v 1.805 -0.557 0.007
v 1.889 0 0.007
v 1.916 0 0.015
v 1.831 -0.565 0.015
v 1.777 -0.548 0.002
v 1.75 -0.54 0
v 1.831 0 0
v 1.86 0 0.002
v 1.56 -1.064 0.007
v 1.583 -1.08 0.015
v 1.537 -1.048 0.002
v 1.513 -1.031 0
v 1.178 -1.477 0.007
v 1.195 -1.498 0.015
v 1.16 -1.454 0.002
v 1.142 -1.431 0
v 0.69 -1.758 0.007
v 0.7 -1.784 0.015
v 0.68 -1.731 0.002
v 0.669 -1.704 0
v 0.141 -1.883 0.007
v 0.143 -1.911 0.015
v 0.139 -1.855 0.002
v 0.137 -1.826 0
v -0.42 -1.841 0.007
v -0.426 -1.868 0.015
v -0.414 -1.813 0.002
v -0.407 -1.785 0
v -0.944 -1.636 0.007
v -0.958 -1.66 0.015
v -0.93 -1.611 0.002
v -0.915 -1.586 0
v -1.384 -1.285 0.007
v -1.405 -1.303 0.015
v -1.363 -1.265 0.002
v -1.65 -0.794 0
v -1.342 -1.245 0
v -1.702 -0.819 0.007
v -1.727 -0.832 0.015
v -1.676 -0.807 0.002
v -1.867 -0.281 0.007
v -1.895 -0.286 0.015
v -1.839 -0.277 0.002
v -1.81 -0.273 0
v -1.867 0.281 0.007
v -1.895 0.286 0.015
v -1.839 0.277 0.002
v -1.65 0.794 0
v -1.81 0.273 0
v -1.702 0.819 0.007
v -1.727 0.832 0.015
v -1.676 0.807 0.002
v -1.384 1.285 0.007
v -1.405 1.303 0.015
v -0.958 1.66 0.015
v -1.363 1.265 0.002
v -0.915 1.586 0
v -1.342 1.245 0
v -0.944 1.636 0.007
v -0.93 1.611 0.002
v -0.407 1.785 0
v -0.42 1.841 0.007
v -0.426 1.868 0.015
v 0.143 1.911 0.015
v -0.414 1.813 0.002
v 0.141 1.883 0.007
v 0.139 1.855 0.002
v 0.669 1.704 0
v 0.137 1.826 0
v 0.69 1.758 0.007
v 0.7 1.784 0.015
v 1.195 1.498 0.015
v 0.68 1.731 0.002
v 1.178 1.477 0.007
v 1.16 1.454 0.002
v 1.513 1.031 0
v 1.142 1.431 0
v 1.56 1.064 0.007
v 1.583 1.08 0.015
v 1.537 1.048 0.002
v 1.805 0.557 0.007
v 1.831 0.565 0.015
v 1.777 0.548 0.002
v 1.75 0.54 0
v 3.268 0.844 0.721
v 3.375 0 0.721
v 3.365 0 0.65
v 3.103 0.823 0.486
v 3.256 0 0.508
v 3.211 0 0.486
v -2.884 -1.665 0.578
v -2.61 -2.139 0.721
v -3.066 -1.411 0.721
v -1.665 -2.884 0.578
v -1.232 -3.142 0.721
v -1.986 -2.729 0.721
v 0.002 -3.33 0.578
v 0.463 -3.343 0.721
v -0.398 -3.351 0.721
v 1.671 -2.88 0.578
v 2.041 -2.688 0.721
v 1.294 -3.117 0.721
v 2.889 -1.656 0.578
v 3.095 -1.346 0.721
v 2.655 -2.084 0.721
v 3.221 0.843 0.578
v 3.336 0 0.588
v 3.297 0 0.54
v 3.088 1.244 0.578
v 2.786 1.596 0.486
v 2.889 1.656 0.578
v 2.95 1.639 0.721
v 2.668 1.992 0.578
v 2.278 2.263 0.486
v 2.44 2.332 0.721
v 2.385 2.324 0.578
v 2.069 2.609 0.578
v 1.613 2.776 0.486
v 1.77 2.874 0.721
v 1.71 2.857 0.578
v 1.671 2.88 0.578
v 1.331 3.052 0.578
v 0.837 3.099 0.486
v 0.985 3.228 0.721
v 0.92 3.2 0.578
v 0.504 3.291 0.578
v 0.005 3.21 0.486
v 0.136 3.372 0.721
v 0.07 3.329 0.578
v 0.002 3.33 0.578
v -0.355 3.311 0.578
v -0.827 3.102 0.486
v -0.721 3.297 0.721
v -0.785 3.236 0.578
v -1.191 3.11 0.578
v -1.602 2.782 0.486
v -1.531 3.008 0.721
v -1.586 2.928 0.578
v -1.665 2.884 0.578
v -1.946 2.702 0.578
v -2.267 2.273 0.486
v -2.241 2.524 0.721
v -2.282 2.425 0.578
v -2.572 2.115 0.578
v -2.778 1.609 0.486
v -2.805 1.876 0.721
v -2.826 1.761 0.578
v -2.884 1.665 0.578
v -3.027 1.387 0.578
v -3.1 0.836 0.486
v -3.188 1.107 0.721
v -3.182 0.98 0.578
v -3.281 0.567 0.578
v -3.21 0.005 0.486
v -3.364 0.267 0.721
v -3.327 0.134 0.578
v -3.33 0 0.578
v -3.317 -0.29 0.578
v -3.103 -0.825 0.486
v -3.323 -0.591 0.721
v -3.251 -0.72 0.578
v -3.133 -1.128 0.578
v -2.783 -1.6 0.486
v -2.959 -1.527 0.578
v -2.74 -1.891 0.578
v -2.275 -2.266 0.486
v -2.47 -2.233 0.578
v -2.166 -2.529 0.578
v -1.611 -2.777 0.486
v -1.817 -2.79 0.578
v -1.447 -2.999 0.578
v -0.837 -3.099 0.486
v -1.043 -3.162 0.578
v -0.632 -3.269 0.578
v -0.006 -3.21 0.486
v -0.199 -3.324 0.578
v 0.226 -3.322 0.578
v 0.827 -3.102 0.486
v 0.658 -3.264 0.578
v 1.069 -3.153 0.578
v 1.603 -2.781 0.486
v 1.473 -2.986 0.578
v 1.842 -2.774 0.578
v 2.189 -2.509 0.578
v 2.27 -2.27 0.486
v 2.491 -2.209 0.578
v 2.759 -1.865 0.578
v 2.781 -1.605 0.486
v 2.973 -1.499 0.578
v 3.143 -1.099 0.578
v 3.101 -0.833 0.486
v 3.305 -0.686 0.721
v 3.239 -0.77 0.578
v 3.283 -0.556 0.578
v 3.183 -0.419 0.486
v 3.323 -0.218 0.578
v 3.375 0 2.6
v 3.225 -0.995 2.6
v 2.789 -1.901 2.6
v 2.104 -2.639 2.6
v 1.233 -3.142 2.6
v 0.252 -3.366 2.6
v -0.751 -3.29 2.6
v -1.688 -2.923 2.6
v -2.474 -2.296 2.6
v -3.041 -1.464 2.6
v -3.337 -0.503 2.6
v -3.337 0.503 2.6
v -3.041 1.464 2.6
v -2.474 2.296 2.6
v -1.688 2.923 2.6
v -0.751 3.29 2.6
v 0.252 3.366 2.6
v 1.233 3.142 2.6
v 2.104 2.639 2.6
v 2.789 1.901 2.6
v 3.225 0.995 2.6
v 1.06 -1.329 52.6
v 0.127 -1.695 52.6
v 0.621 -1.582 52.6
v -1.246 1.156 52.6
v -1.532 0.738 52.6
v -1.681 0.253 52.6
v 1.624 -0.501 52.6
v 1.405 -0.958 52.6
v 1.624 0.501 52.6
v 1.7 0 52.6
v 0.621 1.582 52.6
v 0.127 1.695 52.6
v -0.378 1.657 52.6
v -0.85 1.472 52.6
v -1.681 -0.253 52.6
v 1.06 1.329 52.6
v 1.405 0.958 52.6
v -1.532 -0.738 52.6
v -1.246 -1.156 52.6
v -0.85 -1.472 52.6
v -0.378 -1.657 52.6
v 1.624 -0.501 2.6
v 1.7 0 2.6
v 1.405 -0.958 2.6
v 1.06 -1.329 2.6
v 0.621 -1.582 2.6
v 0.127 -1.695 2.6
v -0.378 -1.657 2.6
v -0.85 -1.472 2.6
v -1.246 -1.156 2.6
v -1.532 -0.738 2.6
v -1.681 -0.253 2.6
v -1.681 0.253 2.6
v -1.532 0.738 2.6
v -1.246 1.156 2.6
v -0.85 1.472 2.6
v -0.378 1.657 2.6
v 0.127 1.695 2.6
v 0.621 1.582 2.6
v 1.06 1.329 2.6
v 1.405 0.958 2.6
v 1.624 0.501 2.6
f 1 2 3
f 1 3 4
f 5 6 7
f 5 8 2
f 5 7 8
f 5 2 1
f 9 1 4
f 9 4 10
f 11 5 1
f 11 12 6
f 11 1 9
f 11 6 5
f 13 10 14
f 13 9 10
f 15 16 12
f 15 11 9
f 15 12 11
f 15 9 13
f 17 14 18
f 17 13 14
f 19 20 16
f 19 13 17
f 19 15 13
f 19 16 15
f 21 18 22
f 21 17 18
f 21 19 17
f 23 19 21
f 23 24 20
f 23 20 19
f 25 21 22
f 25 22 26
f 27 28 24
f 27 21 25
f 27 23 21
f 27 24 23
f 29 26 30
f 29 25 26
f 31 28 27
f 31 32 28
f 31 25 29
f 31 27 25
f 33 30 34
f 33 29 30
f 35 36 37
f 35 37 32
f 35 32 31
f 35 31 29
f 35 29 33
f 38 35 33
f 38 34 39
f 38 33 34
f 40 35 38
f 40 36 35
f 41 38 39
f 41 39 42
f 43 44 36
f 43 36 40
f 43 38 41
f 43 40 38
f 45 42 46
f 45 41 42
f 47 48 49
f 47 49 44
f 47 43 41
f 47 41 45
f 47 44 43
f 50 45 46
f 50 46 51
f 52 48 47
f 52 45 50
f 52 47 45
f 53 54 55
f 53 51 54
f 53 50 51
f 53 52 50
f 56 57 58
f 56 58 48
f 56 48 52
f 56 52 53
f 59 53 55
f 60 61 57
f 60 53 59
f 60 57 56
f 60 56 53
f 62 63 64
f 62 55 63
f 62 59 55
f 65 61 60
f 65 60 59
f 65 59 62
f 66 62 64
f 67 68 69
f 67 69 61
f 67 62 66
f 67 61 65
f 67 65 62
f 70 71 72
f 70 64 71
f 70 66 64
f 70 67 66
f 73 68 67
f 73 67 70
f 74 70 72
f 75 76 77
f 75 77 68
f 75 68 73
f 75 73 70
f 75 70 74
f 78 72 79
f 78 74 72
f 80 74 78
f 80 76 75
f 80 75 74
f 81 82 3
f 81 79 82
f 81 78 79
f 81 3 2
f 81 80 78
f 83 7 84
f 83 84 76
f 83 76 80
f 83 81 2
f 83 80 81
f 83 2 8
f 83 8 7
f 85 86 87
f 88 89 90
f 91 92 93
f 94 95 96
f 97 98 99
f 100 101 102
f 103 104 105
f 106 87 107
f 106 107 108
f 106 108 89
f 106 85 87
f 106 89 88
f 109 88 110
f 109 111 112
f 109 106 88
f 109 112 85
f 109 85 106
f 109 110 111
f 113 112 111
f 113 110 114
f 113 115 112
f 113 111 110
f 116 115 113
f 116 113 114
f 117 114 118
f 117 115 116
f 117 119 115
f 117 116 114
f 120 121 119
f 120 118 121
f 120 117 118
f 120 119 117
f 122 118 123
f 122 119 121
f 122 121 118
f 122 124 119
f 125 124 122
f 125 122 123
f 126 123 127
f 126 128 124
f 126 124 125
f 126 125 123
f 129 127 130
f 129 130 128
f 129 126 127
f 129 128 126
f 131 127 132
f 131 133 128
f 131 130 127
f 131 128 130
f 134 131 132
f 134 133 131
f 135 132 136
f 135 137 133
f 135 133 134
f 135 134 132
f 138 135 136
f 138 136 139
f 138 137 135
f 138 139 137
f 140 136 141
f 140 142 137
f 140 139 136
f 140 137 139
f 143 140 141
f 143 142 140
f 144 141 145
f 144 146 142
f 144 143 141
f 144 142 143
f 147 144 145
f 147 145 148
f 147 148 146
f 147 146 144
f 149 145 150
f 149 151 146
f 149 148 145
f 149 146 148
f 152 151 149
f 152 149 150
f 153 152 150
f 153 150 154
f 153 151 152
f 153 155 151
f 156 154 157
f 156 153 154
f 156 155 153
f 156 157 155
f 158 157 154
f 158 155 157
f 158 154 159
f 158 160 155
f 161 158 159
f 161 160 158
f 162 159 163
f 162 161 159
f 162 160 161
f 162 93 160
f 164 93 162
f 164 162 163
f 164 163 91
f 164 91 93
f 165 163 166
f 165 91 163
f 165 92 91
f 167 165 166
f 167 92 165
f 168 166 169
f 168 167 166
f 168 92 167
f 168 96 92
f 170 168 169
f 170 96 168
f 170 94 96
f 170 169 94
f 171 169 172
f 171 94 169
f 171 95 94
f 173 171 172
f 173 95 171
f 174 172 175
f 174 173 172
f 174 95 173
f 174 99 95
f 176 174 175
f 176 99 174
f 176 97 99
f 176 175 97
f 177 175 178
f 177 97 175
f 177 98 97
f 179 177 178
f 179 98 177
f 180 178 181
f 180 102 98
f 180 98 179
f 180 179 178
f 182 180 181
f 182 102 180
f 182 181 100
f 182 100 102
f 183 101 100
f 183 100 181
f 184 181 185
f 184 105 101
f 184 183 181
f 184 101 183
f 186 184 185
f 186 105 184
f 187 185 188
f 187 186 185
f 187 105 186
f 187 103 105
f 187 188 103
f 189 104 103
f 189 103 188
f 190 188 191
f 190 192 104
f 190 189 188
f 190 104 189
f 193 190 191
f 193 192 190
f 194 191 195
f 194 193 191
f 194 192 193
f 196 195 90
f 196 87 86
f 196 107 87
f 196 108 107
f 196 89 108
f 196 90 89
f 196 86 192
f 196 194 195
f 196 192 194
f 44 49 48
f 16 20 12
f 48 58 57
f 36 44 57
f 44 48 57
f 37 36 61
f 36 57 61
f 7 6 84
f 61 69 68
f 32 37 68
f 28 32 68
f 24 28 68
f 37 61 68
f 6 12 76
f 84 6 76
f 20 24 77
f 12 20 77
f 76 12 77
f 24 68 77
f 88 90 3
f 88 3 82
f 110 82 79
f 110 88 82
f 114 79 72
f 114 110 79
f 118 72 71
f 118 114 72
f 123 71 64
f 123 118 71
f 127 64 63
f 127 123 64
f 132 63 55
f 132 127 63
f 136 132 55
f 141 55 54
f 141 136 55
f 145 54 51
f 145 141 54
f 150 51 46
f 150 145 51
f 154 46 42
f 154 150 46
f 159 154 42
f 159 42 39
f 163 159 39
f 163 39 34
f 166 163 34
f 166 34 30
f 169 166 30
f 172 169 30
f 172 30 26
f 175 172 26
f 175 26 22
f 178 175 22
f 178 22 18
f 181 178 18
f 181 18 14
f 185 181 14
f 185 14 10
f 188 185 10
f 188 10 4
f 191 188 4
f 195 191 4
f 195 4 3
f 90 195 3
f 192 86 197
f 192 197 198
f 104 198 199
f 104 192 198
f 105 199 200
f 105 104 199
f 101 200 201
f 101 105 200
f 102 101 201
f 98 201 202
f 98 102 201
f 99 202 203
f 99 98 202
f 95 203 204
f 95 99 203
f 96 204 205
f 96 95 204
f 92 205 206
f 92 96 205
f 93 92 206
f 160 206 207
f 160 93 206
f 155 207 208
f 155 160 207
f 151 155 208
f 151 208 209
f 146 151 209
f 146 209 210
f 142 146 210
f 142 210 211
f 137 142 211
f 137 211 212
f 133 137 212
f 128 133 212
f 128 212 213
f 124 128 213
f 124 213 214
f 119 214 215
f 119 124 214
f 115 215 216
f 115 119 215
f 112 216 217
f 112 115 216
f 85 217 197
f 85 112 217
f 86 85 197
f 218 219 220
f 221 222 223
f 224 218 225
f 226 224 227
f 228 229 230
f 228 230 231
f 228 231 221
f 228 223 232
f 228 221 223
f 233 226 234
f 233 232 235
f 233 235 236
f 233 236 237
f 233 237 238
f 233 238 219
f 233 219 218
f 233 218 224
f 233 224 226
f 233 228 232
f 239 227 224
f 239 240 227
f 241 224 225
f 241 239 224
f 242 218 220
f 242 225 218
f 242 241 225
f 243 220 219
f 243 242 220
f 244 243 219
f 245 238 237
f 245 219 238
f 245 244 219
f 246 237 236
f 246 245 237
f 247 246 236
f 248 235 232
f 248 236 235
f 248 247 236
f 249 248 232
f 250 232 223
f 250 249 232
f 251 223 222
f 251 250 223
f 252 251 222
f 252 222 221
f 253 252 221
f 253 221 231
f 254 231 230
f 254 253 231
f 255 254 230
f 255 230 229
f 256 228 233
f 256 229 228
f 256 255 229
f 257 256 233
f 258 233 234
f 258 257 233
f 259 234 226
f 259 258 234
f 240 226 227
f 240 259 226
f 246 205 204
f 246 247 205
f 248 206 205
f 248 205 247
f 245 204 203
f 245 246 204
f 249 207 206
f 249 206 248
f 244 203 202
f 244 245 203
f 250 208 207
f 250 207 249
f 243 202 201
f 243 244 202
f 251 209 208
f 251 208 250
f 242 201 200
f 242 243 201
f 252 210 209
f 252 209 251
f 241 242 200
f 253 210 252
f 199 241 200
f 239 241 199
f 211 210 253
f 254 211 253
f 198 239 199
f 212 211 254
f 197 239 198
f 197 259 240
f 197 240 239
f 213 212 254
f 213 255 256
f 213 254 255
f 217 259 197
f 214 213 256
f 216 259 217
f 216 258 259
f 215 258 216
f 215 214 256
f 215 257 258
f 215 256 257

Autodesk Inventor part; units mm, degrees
ref_plane "YZ Plane" through (0, 0, 0) normal (1, 0, 0) x (0, 1, 0)
ref_plane "XZ Plane" through (0, 0, 0) normal (0, 1, 0) x (-1, 0, 0)
ref_plane "XY Plane" through (0, 0, 0) normal (0, 0, 1) x (1, 0, 0)
sketch "Sketch1" plane through (0, 0, 0) normal (0, 0, 1) x (1, 0, 0)
  circle A0 centre (0, 0) radius 3.375
  dimension "d0" = 6.75
extrude "Extrusion1" add sketch "Sketch1" along normal blind 2.6
sketch "Sketch2" plane through (0, 0, 2.6) normal (0, 0, 1) x (1, 0, 0)
  circle A0 centre (0, 0) radius 1.7
  dimension "d3" = 3.4
extrude "Extrusion2" add sketch "Sketch2" along normal blind 50
thread "Thread1" size "M3.5x0.6" class "6g" standard "ANSI Metric M Profile" full length
chamfer "Chamfer1" distance 1.5 angle 20 1 edges at (-3.375, 0, 0) measured on face at (1.1885, -0.5228, 0)
fillet "Fillet1" radius 0.25 2 edges at (-3.375, 0, 0.546) (-1.875, 0, 0)
properties part number "6-32_Bolt"
